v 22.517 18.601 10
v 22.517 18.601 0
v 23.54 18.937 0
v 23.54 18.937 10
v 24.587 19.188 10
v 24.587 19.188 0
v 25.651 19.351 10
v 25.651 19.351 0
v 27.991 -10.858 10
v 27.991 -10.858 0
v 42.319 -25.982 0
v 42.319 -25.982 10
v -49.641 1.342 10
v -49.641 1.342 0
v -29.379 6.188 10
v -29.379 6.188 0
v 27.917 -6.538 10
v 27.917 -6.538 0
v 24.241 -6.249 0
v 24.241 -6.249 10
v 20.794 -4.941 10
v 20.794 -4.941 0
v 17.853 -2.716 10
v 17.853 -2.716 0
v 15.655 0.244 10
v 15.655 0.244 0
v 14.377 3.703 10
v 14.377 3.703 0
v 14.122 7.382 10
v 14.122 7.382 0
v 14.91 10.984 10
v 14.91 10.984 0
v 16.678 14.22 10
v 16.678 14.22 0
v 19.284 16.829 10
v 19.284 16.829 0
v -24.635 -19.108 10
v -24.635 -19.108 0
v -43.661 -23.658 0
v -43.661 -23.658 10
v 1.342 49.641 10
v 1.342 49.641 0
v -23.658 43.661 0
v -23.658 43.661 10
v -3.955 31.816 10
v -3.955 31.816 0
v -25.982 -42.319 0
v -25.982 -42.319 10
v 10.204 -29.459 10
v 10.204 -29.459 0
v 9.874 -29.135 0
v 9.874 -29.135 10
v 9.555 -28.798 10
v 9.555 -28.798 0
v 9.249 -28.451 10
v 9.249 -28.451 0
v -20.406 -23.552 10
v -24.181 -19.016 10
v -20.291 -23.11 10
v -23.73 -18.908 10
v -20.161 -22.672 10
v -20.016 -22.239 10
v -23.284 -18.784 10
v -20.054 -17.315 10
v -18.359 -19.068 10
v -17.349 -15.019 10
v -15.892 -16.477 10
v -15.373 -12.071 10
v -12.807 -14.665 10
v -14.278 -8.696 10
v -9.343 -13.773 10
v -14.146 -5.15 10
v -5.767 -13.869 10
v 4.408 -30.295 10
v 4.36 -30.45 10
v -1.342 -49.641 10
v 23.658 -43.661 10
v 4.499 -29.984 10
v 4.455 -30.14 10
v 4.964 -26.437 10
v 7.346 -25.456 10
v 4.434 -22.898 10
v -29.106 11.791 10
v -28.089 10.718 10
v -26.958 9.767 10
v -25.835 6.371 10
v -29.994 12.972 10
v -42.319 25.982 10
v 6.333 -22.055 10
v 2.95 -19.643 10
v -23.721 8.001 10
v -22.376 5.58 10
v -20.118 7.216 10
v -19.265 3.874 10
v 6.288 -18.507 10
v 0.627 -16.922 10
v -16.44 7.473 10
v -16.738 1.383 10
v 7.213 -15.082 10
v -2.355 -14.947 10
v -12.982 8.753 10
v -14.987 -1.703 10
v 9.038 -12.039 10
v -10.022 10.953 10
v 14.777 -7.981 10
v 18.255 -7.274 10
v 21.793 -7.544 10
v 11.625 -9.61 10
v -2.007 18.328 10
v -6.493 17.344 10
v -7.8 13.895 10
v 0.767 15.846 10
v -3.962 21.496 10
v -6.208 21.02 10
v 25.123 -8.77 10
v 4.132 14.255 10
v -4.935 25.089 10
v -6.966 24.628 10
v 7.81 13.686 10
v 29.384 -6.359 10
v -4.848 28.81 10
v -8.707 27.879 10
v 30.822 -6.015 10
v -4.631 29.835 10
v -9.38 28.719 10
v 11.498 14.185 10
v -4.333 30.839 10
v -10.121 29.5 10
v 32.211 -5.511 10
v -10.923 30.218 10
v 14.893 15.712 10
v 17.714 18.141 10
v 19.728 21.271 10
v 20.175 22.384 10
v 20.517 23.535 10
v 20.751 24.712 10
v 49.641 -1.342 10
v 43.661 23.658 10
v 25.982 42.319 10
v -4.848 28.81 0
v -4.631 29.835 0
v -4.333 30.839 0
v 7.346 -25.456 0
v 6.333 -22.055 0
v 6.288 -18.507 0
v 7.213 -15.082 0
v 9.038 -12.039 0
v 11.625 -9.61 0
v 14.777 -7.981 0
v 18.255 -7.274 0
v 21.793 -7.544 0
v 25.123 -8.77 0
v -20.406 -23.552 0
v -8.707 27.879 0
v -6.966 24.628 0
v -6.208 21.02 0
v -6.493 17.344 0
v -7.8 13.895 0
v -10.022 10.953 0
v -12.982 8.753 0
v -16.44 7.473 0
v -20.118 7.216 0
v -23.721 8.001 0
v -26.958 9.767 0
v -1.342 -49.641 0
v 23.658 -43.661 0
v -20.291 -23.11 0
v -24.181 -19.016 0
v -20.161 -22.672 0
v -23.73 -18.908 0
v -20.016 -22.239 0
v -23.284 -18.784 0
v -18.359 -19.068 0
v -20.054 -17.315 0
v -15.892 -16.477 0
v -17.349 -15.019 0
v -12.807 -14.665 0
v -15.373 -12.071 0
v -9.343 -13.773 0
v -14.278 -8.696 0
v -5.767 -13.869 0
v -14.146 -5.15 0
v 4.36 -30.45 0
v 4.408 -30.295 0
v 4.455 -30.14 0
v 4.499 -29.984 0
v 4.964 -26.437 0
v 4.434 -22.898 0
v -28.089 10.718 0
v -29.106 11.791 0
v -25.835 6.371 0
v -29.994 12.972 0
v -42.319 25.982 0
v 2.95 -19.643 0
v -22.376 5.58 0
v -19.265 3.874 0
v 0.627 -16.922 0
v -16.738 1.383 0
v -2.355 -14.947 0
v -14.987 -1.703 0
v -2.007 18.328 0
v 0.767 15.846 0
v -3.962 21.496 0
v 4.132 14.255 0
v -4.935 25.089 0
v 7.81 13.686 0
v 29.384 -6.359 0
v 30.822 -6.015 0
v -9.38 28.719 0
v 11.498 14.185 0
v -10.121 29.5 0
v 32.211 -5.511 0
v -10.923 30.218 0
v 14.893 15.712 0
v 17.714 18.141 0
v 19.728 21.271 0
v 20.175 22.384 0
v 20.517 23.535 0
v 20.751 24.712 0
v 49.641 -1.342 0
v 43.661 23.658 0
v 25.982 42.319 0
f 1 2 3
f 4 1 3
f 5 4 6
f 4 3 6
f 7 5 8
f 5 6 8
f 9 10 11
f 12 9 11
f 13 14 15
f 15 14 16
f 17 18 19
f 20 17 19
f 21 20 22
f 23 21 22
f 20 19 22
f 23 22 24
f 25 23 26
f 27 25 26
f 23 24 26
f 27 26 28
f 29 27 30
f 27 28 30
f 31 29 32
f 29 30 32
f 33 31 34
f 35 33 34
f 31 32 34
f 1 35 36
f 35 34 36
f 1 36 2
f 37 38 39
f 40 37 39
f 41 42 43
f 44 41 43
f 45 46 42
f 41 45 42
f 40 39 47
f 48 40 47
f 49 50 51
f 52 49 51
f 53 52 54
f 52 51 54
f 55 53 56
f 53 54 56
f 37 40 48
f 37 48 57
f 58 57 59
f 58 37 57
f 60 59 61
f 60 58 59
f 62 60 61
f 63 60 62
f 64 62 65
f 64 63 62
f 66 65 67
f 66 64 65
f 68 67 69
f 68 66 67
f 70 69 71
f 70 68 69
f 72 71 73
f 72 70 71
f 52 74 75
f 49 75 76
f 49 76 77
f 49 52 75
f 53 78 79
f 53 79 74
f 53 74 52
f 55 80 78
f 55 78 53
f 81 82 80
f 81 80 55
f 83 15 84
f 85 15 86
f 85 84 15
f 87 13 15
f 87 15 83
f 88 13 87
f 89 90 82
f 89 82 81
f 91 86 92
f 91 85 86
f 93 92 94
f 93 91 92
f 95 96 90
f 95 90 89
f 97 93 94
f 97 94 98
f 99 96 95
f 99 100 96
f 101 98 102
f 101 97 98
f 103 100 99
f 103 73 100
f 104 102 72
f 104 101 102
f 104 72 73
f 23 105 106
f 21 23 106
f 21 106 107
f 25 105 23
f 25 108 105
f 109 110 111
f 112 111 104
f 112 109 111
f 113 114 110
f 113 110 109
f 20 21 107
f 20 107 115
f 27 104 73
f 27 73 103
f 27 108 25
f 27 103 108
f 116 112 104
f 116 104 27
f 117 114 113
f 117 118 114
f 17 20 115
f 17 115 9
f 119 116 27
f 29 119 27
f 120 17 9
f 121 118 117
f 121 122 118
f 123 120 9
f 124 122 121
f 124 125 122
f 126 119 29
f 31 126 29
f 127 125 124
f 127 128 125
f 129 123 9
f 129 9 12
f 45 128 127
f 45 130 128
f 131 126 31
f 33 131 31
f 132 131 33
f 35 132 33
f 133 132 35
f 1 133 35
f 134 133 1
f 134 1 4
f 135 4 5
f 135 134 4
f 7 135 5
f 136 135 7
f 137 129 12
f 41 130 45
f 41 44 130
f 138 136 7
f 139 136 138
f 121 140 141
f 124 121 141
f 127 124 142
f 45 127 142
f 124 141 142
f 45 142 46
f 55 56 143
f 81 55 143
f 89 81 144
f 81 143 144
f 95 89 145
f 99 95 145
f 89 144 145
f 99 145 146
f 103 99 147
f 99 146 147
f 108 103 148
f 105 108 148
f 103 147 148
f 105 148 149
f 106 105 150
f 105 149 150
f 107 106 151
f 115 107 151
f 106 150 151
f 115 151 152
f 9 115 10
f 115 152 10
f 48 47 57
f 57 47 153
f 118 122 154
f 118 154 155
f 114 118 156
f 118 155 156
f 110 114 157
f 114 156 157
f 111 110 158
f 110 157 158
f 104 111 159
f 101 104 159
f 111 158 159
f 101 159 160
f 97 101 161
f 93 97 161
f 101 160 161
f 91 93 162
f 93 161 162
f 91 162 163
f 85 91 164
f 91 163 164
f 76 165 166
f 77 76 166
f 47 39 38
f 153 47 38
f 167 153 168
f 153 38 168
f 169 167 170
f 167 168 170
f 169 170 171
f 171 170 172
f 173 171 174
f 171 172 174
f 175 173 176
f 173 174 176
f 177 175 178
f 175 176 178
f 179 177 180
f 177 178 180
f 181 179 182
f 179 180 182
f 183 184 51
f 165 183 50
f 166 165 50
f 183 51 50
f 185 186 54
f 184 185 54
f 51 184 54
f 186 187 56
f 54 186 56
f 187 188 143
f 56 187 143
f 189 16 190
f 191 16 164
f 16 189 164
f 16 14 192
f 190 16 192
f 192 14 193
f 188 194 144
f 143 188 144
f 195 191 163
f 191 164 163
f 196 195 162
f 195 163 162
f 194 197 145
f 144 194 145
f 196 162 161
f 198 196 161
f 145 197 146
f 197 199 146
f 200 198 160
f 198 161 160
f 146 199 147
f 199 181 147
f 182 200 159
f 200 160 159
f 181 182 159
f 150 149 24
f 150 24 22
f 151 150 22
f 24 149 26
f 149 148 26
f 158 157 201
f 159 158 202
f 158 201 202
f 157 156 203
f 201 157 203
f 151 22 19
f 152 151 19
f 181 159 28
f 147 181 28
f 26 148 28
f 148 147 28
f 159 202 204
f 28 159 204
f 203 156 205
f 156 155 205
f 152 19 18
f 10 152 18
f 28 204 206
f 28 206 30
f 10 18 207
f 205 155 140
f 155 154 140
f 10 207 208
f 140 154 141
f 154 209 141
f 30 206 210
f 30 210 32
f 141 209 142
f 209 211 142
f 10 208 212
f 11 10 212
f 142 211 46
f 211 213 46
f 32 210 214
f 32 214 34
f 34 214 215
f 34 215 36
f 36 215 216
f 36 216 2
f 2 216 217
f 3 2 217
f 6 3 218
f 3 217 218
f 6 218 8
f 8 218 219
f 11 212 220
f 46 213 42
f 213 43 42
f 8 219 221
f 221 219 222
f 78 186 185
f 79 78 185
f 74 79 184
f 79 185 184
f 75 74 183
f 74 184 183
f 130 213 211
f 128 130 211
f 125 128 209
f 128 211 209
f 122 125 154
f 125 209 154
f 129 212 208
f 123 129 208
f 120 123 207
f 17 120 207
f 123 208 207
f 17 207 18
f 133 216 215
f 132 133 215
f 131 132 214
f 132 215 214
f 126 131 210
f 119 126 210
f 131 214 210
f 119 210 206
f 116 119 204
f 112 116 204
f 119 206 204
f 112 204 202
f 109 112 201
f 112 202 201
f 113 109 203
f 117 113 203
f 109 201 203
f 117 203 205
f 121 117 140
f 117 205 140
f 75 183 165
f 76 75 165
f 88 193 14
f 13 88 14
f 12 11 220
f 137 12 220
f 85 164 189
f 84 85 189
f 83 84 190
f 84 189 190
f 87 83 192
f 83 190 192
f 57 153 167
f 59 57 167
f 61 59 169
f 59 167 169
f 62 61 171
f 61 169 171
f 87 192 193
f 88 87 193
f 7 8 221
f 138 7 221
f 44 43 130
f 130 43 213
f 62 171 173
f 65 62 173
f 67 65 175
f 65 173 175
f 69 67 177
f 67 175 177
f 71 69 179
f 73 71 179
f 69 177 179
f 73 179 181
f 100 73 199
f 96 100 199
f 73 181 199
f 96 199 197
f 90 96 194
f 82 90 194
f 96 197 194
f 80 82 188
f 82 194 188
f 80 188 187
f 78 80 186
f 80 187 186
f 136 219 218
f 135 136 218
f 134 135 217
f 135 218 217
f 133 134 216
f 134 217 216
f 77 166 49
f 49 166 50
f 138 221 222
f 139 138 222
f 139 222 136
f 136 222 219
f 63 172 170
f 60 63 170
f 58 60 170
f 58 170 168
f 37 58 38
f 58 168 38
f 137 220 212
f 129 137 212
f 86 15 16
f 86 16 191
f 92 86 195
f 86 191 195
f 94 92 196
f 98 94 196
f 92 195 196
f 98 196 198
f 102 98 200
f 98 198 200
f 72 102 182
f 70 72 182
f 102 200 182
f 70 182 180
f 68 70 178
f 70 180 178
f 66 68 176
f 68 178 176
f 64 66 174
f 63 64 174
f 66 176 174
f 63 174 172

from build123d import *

# Parameters (mm, degrees)
F1_DEPTH = 10


# Not quite as in the source:
# - a feature of the source that left no trace in its solid (it failed there, or was rolled back) is left out


with BuildPart() as f1:
    # F0 (on Top) → F1 (new body)
    with BuildSketch(Plane.XY):
        with BuildLine():
            Line((-29.9939722279, 12.9722623931), (-42.3191245349, 25.9821456543))
            Line((-42.3191245349, 25.9821456543), (-49.6405097403, 1.341635914))
            Line((-49.6405097403, 1.341635914), (-29.3788570259, 6.1880200524))
            ThreePointArc((-29.3788570259, 6.1880200524), (-14.4470126823, -3.3975764275), (-23.2838200208, -18.7844042826))
            ThreePointArc((-23.2838200208, -18.7844042826), (-23.9549101464, -18.9642061938), (-24.6347260756, -19.1075274636))
            Line((-24.6347260756, -19.1075274636), (-43.6607604489, -23.658364086))
            Line((-43.6607604489, -23.658364086), (-25.9821456543, -42.3191245349))
            Line((-25.9821456543, -42.3191245349), (-20.4059776484, -23.5522357279))
            ThreePointArc((-20.4059776484, -23.5522357279), (-20.2283734176, -22.8904168158), (-20.0157770781, -22.2389950387))
            ThreePointArc((-20.0157770781, -22.2389950387), (-4.0233304879, -14.28870031), (4.4989162669, -29.9838219872))
            ThreePointArc((4.4989162669, -29.9838219872), (4.4318374321, -30.2176557723), (4.3603484872, -30.4501791902))
            Line((4.3603484872, -30.4501791902), (-1.341635914, -49.6405097403))
            Line((-1.341635914, -49.6405097403), (23.658364086, -43.6607604489))
            Line((23.658364086, -43.6607604489), (10.2042067758, -29.4591496596))
            ThreePointArc((10.2042067758, -29.4591496596), (9.7129486903, -28.9678695182), (9.2489208652, -28.4507922885))
            ThreePointArc((9.2489208652, -28.4507922885), (10.2477999291, -10.735096536), (27.9912063973, -10.8582317502))
            Line((27.9912063973, -10.8582317502), (42.3191245349, -25.9821456543))
            Line((42.3191245349, -25.9821456543), (49.6405097403, -1.341635914))
            Line((49.6405097403, -1.341635914), (32.2110441824, -5.5105892868))
            ThreePointArc((32.2110441824, -5.5105892868), (30.1080602508, -6.2077620929), (27.9172204019, -6.5376288751))
            ThreePointArc((27.9172204019, -6.5376288751), (14.3772643763, 3.7032958994), (22.517444526, 18.6010949497))
            ThreePointArc((22.517444526, 18.6010949497), (24.0610630231, 19.0733865517), (25.6513214754, 19.3506868884))
            Line((25.6513214754, 19.3506868884), (43.6607604489, 23.658364086))
            Line((43.6607604489, 23.658364086), (25.9821456543, 42.3191245349))
            Line((25.9821456543, 42.3191245349), (20.7505372467, 24.7118693081))
            ThreePointArc((20.7505372467, 24.7118693081), (20.3589951368, 22.9556577497), (19.7280350427, 21.2705839763))
            ThreePointArc((19.7280350427, 21.2705839763), (4.1315999448, 14.2550710192), (-4.8477844397, 28.8096876713))
            ThreePointArc((-4.8477844397, 28.8096876713), (-4.4924498123, 30.3397177103), (-3.9546627515, 31.8155360239))
            Line((-3.9546627515, 31.8155360239), (1.341635914, 49.6405097403))
            Line((1.341635914, 49.6405097403), (-23.658364086, 43.6607604489))
            Line((-23.658364086, 43.6607604489), (-10.9230867149, 30.2179673888))
            ThreePointArc((-10.9230867149, 30.2179673888), (-9.7422609409, 29.1173003575), (-8.7069825787, 27.8787463076))
            ThreePointArc((-8.7069825787, 27.8787463076), (-10.0224304809, 10.9531282619), (-26.9576179635, 9.767221714))
            ThreePointArc((-26.9576179635, 9.767221714), (-28.6128792901, 11.2398728194), (-29.9939722279, 12.9722623931))
        make_face()
    extrude(amount=F1_DEPTH)


solid = f1.part
